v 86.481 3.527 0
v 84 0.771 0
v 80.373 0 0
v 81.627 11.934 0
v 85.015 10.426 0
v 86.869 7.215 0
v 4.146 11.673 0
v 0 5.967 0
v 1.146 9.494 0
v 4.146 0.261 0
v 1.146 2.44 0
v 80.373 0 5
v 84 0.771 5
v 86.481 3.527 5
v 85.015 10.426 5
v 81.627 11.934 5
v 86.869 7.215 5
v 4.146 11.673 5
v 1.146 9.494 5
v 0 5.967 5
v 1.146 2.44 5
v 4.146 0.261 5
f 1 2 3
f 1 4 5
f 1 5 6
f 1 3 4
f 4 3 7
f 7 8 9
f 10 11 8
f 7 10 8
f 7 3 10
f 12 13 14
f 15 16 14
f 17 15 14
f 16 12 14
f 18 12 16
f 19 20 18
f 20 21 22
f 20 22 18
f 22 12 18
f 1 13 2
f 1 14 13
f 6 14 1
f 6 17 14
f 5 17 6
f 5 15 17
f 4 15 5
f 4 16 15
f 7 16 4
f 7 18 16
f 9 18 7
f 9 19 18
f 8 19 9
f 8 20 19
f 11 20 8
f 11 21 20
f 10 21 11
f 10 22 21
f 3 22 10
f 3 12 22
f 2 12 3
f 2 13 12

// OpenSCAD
$fn = 32;

// ----------------------------------------------------------------------
// Lever arm: two bosses 12 and 12 mm, 75 mm between centres
// ----------------------------------------------------------------------

// --- parameters (mm) ---
profile_height = 5;       // extrusion height
profile_points = 11;      // points of the closed outline

profile = [[0, 5.967], [1.146, 2.44], [4.146, 0.261], [80.373, 0], [84, 0.771], [86.481, 3.527], [86.869, 7.215], [85.015, 10.426], [81.627, 11.934], [4.146, 11.673], [1.146, 9.494]];  // single closed polygon, 11 points, counter clockwise

// --- the one profile operation ---
linear_extrude(height = profile_height) polygon(points = profile);
